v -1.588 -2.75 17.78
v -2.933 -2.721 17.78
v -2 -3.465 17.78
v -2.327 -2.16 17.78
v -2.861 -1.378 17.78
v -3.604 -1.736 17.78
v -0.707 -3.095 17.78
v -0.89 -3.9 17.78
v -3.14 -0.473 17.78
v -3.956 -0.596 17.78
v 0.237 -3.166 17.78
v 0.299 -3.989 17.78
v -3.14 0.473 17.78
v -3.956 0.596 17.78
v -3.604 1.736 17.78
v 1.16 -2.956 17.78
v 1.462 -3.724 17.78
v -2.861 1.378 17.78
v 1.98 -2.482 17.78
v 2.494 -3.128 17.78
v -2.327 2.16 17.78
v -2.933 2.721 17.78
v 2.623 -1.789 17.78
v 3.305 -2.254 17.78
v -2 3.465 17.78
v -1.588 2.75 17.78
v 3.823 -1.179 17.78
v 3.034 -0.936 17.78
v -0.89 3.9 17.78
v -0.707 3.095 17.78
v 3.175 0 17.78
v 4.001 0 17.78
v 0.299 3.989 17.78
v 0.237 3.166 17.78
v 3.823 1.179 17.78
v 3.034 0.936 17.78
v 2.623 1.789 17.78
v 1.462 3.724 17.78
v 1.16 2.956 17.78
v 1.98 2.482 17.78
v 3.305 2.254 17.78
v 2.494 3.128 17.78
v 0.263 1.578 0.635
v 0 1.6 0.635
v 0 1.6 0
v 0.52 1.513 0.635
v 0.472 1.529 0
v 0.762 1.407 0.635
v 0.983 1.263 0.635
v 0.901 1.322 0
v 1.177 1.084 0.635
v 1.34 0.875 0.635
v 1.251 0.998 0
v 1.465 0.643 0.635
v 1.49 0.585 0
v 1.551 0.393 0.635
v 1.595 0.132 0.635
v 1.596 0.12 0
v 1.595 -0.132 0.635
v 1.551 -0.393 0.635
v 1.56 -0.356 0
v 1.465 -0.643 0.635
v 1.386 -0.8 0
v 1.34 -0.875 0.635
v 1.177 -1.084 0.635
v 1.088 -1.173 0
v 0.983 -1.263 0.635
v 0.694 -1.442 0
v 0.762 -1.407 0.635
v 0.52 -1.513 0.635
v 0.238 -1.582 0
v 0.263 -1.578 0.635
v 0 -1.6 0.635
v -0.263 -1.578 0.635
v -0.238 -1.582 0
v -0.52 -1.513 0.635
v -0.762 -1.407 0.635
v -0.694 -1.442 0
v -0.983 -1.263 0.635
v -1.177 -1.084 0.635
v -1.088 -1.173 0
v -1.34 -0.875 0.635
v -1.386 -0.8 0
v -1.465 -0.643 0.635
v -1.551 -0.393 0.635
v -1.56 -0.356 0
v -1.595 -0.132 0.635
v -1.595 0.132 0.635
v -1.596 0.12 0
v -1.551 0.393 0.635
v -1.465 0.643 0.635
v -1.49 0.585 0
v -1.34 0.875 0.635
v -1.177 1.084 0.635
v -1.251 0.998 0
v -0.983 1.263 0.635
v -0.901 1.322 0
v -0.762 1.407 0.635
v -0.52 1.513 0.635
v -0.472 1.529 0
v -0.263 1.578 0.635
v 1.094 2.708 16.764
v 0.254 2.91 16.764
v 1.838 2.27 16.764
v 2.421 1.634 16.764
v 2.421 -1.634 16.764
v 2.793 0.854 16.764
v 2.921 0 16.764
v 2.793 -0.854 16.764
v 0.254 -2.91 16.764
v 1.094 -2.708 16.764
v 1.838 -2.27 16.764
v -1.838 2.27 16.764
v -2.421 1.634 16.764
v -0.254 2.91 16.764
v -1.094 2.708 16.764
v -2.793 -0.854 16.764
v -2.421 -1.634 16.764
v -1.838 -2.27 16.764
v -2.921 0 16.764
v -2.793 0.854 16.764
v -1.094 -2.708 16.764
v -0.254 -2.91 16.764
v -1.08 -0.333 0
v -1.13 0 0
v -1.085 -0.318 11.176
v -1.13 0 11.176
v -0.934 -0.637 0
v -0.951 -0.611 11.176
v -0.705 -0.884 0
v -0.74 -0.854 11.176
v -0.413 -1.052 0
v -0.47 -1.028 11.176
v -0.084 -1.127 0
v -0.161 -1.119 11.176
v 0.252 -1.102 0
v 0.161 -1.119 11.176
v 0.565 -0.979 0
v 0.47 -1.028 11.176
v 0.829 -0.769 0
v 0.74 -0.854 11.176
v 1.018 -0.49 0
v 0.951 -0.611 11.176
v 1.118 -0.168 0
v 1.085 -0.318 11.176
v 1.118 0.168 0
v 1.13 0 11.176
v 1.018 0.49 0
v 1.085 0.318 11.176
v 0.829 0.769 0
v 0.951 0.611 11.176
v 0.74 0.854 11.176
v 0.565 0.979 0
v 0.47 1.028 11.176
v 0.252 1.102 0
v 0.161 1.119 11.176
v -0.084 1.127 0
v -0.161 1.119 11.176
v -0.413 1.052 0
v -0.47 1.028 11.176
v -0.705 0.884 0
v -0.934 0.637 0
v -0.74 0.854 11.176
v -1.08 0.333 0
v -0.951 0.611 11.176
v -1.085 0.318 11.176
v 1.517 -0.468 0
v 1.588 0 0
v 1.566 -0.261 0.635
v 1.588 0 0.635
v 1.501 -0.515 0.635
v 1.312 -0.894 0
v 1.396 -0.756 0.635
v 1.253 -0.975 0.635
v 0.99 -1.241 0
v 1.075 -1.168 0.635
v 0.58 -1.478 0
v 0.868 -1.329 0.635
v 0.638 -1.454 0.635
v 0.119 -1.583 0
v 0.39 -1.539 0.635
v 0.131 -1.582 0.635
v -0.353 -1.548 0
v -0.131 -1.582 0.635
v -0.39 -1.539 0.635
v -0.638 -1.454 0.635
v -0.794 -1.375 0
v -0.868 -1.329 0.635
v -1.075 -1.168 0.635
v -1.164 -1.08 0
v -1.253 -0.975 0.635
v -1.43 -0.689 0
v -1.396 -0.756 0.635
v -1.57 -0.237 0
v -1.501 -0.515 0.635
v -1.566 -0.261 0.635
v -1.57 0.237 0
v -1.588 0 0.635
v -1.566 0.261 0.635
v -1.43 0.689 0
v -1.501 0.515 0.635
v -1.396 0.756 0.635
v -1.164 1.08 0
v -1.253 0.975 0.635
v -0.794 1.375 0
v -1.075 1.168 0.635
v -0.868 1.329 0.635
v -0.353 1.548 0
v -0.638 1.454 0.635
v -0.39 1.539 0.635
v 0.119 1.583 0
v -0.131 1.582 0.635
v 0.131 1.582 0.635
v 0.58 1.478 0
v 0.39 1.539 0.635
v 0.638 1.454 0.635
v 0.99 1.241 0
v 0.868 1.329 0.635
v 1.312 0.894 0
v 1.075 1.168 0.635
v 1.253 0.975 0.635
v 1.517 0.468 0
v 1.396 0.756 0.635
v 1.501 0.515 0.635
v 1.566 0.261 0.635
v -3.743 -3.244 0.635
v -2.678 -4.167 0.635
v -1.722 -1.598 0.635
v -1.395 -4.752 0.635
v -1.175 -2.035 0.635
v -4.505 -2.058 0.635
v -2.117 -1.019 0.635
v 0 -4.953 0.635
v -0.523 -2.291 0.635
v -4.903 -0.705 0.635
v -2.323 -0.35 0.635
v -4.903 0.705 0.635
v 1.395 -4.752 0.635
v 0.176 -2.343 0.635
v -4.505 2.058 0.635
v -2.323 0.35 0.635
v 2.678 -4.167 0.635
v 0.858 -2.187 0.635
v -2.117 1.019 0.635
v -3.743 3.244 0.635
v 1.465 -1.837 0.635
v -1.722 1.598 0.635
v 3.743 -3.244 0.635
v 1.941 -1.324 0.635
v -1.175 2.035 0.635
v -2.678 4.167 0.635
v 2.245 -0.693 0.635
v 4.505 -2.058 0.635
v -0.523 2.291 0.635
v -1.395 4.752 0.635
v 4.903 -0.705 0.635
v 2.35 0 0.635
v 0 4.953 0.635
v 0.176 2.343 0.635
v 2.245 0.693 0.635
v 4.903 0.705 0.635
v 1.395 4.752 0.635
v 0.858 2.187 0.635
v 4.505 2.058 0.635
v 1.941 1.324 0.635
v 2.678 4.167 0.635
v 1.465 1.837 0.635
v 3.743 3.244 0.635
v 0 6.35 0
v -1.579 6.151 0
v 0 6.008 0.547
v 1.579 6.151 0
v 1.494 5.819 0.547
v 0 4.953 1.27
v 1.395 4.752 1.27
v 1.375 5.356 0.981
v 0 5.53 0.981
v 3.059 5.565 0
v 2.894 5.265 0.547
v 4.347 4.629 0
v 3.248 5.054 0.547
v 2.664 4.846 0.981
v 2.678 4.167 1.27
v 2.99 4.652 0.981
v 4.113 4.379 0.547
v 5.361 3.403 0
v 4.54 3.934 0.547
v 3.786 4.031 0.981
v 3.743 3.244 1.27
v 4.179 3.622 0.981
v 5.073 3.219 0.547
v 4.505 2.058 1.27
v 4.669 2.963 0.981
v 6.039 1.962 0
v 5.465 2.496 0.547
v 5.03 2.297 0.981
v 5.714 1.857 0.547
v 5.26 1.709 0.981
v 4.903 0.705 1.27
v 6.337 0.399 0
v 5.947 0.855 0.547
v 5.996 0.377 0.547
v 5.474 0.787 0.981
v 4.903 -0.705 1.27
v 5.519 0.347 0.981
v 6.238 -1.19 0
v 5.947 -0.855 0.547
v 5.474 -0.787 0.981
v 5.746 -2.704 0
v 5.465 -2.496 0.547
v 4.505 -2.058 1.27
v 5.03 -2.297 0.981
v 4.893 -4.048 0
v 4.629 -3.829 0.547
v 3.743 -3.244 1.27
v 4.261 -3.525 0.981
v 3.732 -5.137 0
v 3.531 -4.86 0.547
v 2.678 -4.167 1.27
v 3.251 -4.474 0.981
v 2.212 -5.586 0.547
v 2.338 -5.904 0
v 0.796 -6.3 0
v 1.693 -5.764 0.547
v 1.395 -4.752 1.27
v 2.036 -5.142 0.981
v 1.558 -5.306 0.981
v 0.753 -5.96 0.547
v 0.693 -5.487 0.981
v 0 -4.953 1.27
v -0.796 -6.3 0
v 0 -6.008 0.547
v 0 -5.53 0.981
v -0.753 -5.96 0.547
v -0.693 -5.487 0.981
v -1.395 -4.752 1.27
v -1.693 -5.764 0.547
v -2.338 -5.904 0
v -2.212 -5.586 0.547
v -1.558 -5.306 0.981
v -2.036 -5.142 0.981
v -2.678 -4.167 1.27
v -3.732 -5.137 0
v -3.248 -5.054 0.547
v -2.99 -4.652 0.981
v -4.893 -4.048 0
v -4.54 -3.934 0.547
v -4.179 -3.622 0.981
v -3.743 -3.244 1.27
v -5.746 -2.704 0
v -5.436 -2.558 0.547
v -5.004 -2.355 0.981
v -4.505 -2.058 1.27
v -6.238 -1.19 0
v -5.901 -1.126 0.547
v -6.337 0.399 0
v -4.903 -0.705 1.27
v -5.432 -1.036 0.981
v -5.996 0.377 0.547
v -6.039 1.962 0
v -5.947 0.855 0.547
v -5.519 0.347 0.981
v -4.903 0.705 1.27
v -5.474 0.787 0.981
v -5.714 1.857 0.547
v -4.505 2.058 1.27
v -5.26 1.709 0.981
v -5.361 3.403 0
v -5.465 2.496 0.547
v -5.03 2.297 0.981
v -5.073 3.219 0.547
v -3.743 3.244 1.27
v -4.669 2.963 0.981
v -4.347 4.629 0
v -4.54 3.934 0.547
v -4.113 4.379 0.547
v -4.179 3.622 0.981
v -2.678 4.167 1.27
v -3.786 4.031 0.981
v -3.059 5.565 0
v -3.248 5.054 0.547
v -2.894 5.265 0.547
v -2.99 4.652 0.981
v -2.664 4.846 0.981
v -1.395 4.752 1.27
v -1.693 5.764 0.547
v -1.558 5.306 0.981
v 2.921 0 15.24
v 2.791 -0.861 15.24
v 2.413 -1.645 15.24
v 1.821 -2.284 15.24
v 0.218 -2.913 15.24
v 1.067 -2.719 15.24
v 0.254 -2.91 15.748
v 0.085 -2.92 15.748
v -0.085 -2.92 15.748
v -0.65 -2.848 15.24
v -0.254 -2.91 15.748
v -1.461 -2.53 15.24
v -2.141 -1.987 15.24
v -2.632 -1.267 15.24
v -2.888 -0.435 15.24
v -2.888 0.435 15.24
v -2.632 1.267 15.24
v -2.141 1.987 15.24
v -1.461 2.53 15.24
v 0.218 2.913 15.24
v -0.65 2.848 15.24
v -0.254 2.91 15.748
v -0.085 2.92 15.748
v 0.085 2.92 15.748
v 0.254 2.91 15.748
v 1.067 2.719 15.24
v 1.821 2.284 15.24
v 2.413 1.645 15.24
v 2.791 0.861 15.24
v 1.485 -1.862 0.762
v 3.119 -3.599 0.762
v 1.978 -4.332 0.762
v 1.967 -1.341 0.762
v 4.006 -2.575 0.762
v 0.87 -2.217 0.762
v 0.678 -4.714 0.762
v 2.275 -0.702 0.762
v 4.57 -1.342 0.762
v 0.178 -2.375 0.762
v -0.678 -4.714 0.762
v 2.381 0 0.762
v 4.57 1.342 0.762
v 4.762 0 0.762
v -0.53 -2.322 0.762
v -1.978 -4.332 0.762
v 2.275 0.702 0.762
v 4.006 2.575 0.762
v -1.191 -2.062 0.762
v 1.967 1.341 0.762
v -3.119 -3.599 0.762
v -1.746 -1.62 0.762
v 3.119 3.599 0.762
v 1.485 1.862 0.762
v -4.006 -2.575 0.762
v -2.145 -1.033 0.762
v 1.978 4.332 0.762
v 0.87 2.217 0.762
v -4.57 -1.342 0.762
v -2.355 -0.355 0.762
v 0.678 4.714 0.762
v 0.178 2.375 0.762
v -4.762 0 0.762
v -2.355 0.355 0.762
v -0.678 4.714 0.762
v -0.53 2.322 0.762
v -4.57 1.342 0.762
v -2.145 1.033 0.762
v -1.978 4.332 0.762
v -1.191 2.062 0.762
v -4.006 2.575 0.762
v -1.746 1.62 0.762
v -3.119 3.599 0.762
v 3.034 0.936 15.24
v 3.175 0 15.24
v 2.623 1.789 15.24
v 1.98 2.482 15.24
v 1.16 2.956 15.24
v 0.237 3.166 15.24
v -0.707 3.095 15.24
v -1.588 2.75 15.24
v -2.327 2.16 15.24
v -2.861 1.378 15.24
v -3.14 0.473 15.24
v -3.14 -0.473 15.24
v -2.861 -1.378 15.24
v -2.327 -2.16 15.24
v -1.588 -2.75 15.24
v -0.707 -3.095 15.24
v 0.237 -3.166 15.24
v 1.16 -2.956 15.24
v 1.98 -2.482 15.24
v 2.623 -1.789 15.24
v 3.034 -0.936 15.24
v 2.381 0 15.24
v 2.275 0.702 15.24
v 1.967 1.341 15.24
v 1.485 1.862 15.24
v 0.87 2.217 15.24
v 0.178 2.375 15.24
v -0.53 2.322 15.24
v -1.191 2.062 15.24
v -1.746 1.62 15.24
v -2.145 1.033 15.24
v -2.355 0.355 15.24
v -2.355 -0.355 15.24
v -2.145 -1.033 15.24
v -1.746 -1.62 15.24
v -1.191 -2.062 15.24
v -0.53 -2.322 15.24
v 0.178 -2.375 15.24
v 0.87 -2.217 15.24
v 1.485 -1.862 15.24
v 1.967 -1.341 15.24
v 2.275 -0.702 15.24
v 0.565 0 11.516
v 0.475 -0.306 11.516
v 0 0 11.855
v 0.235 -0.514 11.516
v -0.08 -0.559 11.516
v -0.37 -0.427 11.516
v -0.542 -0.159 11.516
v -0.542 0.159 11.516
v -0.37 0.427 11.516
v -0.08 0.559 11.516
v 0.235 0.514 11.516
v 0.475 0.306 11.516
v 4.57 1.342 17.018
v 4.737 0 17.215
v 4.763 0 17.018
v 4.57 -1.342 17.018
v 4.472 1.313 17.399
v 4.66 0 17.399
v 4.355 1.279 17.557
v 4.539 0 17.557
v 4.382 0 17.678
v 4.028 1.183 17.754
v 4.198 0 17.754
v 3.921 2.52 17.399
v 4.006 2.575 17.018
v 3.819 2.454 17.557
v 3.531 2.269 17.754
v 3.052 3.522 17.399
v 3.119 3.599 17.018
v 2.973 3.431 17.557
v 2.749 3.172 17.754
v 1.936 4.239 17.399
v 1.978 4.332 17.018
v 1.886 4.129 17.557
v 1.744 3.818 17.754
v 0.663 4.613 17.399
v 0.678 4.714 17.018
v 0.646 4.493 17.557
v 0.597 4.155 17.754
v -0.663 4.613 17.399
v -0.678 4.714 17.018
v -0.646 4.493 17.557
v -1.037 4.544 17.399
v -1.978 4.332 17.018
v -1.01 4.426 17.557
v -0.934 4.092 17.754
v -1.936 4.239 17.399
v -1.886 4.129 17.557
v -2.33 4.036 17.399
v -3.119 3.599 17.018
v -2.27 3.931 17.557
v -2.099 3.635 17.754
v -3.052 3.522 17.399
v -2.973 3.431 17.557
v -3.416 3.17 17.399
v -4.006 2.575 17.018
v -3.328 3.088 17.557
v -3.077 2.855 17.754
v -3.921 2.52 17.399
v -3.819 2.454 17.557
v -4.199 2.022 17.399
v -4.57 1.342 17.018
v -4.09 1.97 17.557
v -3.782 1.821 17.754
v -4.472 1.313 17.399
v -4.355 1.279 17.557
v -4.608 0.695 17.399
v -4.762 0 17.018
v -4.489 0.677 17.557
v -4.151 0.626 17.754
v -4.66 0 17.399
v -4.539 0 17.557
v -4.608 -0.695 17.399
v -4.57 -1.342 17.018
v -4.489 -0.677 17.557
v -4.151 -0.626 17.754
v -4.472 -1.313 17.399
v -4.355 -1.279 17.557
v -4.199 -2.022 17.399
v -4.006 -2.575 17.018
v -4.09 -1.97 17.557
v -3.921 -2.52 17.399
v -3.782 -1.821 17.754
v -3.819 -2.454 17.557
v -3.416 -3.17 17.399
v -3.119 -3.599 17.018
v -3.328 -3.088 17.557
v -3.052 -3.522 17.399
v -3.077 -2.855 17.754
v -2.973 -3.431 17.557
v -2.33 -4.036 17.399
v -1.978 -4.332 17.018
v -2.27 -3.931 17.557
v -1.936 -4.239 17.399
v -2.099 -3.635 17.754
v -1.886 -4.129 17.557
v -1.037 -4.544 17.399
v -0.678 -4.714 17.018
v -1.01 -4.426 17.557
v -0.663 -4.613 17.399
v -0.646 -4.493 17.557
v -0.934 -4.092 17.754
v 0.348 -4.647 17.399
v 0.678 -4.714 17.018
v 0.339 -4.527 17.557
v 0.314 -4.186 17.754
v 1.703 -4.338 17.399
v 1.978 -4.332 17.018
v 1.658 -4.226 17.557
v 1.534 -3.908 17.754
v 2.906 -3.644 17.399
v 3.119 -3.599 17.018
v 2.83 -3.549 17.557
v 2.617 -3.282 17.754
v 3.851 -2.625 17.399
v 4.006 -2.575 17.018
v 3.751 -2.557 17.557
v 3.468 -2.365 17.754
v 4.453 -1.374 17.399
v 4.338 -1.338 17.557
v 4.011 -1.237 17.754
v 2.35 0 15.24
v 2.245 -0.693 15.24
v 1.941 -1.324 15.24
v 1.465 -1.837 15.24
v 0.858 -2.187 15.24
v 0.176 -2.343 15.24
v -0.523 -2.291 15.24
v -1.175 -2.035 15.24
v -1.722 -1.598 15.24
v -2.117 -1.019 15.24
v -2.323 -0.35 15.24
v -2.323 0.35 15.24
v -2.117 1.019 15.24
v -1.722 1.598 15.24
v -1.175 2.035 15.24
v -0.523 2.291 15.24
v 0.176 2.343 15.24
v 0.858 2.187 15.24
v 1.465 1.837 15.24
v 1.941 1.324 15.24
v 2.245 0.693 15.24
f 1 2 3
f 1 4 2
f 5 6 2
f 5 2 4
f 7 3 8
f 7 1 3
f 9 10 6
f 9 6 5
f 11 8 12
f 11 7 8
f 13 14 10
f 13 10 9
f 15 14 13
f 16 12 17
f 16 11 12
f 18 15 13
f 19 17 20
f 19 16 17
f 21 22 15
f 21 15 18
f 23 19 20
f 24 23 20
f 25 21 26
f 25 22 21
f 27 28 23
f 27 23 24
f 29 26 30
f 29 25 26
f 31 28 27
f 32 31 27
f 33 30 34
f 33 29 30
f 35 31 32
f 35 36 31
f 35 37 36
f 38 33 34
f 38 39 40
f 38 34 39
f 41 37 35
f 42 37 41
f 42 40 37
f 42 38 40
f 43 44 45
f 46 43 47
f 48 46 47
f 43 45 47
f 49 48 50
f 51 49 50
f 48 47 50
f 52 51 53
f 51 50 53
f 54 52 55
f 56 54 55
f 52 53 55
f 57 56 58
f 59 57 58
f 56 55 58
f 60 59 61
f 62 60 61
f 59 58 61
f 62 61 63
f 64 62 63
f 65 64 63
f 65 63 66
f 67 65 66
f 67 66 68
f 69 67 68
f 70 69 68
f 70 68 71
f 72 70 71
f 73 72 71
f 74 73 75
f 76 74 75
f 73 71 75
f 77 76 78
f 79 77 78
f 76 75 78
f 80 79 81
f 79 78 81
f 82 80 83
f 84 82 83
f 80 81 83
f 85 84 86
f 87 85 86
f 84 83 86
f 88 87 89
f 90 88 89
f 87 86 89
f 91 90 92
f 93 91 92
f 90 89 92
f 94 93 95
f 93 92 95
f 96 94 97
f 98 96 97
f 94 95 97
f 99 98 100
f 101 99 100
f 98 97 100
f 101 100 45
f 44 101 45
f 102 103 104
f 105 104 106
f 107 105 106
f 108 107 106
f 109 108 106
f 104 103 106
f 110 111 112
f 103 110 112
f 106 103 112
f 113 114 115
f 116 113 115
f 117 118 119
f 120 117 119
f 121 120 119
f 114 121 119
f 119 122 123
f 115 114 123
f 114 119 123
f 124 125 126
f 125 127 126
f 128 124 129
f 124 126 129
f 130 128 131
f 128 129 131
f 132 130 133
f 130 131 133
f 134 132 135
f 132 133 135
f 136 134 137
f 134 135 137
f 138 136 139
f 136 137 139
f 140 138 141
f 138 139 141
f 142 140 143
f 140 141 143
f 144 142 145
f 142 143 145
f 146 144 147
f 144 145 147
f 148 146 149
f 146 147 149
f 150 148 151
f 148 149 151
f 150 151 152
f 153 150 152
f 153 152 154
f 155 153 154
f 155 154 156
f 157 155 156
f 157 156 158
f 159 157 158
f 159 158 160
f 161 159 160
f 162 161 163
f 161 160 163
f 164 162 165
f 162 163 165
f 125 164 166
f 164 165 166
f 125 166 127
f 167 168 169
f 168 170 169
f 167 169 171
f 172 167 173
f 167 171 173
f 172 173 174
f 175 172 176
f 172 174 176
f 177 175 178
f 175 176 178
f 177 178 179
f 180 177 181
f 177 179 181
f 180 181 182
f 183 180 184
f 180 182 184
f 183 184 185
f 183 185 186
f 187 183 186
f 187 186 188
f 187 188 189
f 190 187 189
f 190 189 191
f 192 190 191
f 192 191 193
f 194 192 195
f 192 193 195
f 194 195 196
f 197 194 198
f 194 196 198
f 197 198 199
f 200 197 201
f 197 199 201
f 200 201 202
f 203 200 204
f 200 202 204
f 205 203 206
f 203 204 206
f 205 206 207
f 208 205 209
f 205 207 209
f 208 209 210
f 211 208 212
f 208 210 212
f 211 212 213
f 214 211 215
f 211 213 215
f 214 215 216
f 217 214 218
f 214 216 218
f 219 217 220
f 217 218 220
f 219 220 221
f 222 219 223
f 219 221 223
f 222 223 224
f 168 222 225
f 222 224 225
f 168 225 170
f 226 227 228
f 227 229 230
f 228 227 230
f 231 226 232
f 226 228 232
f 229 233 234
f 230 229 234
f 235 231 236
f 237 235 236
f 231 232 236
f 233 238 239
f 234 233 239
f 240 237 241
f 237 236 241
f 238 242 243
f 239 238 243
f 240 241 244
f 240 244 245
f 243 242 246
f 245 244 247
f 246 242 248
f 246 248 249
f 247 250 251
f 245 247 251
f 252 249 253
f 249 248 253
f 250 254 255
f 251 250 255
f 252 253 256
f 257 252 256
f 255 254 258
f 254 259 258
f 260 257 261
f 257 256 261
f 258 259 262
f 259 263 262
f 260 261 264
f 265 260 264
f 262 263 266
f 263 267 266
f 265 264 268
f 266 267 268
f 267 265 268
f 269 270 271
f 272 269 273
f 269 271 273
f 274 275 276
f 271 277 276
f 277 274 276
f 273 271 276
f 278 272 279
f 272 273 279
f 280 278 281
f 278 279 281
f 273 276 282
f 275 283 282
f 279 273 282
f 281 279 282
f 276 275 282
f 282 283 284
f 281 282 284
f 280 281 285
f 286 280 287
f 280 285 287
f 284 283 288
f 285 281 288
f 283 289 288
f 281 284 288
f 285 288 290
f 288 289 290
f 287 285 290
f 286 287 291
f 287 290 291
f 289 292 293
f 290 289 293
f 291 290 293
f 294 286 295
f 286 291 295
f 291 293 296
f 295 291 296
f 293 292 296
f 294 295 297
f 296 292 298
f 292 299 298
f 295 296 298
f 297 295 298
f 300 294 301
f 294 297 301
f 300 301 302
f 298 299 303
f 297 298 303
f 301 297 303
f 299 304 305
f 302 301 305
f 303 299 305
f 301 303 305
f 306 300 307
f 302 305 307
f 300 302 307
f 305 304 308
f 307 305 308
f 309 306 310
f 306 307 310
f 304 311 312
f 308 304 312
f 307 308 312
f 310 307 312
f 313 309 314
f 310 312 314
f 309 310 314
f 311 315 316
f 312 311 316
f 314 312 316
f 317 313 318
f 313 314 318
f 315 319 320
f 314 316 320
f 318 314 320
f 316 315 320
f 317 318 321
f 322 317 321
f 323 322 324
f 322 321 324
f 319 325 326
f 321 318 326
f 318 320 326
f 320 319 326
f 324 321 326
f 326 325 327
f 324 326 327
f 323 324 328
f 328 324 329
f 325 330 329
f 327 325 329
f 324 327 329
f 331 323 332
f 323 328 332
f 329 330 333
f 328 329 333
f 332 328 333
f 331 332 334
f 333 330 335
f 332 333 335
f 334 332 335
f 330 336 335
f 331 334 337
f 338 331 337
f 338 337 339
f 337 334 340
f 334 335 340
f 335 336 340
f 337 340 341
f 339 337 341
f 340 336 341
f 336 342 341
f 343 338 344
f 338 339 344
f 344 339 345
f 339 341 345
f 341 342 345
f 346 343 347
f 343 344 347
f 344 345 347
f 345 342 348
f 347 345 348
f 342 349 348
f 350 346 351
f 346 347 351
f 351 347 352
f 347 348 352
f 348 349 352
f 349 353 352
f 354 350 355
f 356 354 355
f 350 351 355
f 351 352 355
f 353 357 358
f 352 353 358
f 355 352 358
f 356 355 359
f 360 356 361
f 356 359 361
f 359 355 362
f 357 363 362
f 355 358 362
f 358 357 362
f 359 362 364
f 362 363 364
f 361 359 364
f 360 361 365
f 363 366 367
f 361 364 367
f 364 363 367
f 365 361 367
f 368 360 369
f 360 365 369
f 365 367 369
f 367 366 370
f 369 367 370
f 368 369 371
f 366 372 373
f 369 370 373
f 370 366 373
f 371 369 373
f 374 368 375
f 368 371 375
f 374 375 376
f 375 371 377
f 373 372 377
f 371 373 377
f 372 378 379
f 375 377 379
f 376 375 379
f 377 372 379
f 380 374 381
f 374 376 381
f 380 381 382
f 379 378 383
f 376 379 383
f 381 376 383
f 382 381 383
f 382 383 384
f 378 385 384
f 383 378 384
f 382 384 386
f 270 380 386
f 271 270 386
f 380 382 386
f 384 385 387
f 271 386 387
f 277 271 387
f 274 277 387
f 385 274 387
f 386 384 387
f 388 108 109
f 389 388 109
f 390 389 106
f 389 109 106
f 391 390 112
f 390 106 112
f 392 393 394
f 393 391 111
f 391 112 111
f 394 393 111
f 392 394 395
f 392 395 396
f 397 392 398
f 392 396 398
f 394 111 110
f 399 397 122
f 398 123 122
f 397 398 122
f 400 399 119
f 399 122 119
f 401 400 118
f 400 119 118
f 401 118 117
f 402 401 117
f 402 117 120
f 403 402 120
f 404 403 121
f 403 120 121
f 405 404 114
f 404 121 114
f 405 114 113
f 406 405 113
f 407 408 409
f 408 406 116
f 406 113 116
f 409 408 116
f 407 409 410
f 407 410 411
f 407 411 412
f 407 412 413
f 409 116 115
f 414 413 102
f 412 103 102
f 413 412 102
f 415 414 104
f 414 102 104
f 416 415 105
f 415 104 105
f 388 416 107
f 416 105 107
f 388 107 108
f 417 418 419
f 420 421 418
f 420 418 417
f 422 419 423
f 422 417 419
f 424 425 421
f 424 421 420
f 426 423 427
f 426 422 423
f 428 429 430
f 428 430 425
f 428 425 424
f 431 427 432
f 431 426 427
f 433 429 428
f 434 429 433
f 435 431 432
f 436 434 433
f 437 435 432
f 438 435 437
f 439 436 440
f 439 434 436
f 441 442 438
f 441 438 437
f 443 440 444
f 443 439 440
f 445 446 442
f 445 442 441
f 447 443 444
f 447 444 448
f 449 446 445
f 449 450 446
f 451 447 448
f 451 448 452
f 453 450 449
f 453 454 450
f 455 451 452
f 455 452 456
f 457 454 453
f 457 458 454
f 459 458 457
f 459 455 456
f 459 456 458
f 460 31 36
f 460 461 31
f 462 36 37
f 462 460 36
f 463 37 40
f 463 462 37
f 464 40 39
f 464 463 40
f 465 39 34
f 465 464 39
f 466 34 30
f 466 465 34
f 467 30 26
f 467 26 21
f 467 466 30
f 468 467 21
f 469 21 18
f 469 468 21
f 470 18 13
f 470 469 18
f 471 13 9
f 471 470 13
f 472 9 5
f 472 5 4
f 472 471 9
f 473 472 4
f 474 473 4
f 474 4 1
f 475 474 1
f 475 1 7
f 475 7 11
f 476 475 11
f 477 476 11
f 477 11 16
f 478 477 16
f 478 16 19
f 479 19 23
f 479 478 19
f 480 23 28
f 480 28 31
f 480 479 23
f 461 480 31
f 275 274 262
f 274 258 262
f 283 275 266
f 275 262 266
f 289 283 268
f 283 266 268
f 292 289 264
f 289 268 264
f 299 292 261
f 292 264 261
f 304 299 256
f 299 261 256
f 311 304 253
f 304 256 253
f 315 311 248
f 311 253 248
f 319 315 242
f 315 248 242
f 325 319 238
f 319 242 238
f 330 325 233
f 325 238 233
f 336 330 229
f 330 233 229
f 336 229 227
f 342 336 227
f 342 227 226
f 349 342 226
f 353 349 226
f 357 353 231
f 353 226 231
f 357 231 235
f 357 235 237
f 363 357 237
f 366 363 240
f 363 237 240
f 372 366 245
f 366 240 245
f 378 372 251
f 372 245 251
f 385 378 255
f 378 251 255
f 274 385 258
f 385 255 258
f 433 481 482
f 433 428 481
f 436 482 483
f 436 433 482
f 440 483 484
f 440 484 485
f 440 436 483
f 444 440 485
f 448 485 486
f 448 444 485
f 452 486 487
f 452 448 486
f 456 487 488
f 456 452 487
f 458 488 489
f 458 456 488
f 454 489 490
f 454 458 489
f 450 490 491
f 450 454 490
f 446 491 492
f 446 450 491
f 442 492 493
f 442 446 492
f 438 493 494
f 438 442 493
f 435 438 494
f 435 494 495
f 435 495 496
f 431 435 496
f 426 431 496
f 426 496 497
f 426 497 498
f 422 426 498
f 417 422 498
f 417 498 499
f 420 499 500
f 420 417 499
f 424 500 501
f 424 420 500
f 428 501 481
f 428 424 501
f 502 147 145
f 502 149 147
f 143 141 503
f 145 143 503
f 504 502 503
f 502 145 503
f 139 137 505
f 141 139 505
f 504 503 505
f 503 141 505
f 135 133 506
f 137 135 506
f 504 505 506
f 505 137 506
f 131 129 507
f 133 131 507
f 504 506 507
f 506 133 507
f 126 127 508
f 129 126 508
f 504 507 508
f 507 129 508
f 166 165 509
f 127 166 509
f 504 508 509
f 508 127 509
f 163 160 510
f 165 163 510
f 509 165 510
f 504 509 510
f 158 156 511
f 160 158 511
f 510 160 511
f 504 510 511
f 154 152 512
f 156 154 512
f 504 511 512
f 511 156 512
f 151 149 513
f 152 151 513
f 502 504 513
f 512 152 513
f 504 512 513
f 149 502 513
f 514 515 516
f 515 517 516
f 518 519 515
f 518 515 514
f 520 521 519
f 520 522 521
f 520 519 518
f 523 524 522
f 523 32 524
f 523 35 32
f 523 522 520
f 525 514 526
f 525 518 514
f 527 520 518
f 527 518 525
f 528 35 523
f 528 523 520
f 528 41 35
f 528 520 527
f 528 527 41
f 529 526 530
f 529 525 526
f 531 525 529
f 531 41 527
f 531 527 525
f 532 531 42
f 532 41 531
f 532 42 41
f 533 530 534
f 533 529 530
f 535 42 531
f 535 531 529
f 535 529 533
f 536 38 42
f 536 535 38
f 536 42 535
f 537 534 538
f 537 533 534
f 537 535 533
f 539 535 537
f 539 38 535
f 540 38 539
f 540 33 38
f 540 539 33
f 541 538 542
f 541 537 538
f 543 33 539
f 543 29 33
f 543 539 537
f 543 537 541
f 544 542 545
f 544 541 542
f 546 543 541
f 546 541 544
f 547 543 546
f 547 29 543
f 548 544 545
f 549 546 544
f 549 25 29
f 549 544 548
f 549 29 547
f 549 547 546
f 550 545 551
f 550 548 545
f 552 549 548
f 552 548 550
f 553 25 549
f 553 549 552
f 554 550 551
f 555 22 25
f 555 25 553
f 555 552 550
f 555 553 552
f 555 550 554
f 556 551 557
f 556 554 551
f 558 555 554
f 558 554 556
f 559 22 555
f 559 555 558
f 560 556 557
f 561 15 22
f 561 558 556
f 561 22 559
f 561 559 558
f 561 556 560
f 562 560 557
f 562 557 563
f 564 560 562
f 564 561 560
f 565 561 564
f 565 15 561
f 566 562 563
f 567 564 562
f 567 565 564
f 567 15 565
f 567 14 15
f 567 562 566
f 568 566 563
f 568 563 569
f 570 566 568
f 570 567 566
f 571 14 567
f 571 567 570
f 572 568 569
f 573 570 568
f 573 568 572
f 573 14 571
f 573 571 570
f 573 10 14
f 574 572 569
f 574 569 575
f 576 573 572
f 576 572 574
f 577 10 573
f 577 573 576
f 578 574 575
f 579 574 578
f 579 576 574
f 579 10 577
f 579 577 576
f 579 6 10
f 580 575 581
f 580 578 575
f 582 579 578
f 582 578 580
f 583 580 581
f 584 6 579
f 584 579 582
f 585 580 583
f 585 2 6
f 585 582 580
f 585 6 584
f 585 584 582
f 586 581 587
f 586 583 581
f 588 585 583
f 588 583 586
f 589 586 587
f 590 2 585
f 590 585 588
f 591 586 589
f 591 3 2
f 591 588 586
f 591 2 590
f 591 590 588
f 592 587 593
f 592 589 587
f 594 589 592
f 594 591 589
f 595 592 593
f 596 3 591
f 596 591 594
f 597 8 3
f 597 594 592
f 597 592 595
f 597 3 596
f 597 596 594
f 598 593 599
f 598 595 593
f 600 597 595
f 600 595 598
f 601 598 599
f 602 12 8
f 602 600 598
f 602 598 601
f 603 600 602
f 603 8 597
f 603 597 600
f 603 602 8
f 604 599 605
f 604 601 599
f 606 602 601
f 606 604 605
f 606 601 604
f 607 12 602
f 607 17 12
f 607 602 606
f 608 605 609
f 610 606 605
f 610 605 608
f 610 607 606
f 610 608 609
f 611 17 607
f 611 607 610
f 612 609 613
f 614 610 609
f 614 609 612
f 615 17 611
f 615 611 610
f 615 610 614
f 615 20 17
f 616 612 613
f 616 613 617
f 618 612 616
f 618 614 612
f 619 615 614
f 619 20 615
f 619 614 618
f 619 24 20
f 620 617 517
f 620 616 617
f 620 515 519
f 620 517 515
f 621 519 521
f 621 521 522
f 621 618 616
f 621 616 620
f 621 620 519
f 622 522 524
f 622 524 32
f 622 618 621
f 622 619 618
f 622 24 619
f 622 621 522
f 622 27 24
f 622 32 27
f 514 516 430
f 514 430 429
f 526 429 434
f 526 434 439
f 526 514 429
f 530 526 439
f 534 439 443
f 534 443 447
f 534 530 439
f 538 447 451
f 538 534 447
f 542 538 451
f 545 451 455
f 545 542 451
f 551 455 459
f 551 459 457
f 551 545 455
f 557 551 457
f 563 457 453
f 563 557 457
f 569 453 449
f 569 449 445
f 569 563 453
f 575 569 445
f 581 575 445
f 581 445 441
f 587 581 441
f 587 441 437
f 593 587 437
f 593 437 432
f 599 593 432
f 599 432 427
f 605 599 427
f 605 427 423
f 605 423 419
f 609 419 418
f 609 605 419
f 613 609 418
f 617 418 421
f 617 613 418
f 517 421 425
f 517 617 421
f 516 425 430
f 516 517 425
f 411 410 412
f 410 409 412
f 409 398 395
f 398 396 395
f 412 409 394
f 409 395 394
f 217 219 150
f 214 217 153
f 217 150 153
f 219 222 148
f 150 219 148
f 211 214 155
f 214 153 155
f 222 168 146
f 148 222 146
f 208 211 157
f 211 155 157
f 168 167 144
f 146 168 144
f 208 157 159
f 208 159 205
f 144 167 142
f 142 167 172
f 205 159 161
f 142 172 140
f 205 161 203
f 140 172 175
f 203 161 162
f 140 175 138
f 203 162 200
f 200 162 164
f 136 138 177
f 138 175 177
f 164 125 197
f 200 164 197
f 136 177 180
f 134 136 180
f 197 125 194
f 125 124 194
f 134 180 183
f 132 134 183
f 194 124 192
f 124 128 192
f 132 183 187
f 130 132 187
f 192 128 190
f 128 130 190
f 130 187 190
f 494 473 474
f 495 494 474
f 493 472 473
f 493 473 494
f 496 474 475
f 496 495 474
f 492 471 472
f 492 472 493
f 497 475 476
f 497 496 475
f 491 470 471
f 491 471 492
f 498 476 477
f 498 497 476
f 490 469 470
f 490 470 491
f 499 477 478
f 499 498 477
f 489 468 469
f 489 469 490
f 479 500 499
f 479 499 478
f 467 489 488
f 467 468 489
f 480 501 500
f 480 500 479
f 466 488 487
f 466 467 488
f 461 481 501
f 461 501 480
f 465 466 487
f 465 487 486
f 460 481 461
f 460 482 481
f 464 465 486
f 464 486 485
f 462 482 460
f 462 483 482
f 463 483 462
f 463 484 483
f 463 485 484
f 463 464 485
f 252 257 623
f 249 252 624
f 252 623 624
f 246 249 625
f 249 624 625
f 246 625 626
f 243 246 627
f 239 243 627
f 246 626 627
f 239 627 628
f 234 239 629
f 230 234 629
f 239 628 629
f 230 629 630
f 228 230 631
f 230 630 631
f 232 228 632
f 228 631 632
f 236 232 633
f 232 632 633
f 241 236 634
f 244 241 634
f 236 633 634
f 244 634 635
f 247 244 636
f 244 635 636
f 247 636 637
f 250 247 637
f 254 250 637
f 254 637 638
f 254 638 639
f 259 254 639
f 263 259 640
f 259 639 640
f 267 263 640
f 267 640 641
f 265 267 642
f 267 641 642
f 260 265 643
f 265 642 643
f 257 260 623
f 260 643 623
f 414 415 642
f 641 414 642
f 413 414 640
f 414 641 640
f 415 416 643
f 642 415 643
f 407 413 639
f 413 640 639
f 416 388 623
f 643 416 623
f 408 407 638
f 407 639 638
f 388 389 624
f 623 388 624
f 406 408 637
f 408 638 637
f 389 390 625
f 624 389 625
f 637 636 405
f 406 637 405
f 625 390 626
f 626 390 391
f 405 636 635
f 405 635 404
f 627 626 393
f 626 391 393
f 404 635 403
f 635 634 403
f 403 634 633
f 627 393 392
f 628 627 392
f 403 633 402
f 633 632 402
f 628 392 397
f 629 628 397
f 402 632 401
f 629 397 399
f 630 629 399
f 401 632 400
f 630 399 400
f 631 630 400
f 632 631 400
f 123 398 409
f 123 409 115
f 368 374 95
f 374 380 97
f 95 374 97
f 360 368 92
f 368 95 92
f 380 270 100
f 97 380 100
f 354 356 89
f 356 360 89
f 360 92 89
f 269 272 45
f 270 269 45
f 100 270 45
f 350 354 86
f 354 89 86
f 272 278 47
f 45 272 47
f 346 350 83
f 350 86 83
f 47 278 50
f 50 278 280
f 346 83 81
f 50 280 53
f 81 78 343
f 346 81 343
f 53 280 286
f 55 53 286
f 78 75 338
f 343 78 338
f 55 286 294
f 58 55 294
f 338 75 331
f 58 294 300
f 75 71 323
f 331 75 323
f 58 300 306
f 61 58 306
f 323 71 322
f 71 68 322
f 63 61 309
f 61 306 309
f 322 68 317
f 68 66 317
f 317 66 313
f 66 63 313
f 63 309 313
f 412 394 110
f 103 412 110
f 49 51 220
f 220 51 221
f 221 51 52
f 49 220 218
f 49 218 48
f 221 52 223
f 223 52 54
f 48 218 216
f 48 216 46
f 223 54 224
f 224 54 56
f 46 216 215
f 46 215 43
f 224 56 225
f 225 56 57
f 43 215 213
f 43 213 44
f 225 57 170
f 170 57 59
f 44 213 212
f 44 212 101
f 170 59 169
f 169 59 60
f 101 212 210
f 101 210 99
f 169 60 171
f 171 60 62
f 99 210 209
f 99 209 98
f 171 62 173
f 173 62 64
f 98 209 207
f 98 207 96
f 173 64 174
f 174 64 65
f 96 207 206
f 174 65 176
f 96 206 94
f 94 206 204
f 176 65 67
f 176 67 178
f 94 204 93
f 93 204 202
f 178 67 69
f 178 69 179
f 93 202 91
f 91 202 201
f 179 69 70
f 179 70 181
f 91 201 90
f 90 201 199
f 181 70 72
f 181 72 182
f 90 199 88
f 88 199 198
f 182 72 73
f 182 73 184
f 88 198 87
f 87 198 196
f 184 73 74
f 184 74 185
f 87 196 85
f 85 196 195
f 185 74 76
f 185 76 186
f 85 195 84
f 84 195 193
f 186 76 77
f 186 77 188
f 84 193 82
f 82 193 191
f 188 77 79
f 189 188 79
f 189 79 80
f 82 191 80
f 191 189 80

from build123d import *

# Parameters (mm, degrees)
F4_W     = 0.508
F4_H     = 2.032
F5_DEPTH = 12.7
F7_D     = 2.2606
F7_DEPTH = 11.176
F7_TIP   = 0.6791527577
F8_R     = 0.762


with BuildPart() as f1:
    # F0 (on Front) → F1 (revolve)
    with BuildSketch(Plane.XZ):
        Polygon((2.38125, 15.24), (2.38125, 0.762), (4.7625, 0.762), (4.7625, 17.78), (3.175, 17.78), (3.175, 15.24), align=None)
    revolve(axis=Axis((0, 0, 9.8730815887), (0, 0, 1)))

    # F8
    f8_edges = [f1.edges().sort_by_distance(p)[0] for p in [
        (-4.7625, 0, 17.78),
    ]]
    fillet(f8_edges, radius=F8_R)


with BuildPart() as f3:
    # F2 (on Front) → F3 (revolve)
    with BuildSketch(Plane.XZ):
        Polygon((0, 16.764), (0, 0), (1.5875, 0), (1.5875, 0.635), (2.3495, 0.635), (2.3495, 15.24), (2.921, 15.24), (2.921, 16.764), align=None)
    revolve(axis=Axis((0, 0, 8.382), (0, 0, -1)))

    # F4 (on Front) → F5 (cut, symmetric)
    with BuildSketch(Plane.XZ):
        with Locations((0, 16.764)):
            Rectangle(F4_W, F4_H)
    extrude(amount=F5_DEPTH, both=True, mode=Mode.SUBTRACT)

    # F7
    with Locations(Plane(origin=(0, 0, 0), x_dir=(1, 0, 0), z_dir=(0, 0, -1))):
        with Locations((0, 0)):
            Hole(F7_D / 2, depth=F7_DEPTH)
            with Locations((0, 0, -(F7_DEPTH + F7_TIP / 2))):  # 118° drill point
                Cone(0, F7_D / 2, F7_TIP, mode=Mode.SUBTRACT)

    # F9 (on Right) → F10 (revolve)
    with BuildSketch(Plane.YZ):
        with BuildLine():
            Line((4.953, 0.635), (1.6002, 0.635))
            Line((1.6002, 0.635), (1.6002, 0))
            Line((1.6002, 0), (6.35, 0))
            ThreePointArc((6.35, 0), (5.7838968502, 0.7806365352), (4.953, 1.27))
            Line((4.953, 1.27), (4.953, 0.635))
        make_face()
    revolve(axis=Axis((0, 0, -1.7858503852), (0, 0, -1)))


solid = Compound([f1.part, f3.part])
